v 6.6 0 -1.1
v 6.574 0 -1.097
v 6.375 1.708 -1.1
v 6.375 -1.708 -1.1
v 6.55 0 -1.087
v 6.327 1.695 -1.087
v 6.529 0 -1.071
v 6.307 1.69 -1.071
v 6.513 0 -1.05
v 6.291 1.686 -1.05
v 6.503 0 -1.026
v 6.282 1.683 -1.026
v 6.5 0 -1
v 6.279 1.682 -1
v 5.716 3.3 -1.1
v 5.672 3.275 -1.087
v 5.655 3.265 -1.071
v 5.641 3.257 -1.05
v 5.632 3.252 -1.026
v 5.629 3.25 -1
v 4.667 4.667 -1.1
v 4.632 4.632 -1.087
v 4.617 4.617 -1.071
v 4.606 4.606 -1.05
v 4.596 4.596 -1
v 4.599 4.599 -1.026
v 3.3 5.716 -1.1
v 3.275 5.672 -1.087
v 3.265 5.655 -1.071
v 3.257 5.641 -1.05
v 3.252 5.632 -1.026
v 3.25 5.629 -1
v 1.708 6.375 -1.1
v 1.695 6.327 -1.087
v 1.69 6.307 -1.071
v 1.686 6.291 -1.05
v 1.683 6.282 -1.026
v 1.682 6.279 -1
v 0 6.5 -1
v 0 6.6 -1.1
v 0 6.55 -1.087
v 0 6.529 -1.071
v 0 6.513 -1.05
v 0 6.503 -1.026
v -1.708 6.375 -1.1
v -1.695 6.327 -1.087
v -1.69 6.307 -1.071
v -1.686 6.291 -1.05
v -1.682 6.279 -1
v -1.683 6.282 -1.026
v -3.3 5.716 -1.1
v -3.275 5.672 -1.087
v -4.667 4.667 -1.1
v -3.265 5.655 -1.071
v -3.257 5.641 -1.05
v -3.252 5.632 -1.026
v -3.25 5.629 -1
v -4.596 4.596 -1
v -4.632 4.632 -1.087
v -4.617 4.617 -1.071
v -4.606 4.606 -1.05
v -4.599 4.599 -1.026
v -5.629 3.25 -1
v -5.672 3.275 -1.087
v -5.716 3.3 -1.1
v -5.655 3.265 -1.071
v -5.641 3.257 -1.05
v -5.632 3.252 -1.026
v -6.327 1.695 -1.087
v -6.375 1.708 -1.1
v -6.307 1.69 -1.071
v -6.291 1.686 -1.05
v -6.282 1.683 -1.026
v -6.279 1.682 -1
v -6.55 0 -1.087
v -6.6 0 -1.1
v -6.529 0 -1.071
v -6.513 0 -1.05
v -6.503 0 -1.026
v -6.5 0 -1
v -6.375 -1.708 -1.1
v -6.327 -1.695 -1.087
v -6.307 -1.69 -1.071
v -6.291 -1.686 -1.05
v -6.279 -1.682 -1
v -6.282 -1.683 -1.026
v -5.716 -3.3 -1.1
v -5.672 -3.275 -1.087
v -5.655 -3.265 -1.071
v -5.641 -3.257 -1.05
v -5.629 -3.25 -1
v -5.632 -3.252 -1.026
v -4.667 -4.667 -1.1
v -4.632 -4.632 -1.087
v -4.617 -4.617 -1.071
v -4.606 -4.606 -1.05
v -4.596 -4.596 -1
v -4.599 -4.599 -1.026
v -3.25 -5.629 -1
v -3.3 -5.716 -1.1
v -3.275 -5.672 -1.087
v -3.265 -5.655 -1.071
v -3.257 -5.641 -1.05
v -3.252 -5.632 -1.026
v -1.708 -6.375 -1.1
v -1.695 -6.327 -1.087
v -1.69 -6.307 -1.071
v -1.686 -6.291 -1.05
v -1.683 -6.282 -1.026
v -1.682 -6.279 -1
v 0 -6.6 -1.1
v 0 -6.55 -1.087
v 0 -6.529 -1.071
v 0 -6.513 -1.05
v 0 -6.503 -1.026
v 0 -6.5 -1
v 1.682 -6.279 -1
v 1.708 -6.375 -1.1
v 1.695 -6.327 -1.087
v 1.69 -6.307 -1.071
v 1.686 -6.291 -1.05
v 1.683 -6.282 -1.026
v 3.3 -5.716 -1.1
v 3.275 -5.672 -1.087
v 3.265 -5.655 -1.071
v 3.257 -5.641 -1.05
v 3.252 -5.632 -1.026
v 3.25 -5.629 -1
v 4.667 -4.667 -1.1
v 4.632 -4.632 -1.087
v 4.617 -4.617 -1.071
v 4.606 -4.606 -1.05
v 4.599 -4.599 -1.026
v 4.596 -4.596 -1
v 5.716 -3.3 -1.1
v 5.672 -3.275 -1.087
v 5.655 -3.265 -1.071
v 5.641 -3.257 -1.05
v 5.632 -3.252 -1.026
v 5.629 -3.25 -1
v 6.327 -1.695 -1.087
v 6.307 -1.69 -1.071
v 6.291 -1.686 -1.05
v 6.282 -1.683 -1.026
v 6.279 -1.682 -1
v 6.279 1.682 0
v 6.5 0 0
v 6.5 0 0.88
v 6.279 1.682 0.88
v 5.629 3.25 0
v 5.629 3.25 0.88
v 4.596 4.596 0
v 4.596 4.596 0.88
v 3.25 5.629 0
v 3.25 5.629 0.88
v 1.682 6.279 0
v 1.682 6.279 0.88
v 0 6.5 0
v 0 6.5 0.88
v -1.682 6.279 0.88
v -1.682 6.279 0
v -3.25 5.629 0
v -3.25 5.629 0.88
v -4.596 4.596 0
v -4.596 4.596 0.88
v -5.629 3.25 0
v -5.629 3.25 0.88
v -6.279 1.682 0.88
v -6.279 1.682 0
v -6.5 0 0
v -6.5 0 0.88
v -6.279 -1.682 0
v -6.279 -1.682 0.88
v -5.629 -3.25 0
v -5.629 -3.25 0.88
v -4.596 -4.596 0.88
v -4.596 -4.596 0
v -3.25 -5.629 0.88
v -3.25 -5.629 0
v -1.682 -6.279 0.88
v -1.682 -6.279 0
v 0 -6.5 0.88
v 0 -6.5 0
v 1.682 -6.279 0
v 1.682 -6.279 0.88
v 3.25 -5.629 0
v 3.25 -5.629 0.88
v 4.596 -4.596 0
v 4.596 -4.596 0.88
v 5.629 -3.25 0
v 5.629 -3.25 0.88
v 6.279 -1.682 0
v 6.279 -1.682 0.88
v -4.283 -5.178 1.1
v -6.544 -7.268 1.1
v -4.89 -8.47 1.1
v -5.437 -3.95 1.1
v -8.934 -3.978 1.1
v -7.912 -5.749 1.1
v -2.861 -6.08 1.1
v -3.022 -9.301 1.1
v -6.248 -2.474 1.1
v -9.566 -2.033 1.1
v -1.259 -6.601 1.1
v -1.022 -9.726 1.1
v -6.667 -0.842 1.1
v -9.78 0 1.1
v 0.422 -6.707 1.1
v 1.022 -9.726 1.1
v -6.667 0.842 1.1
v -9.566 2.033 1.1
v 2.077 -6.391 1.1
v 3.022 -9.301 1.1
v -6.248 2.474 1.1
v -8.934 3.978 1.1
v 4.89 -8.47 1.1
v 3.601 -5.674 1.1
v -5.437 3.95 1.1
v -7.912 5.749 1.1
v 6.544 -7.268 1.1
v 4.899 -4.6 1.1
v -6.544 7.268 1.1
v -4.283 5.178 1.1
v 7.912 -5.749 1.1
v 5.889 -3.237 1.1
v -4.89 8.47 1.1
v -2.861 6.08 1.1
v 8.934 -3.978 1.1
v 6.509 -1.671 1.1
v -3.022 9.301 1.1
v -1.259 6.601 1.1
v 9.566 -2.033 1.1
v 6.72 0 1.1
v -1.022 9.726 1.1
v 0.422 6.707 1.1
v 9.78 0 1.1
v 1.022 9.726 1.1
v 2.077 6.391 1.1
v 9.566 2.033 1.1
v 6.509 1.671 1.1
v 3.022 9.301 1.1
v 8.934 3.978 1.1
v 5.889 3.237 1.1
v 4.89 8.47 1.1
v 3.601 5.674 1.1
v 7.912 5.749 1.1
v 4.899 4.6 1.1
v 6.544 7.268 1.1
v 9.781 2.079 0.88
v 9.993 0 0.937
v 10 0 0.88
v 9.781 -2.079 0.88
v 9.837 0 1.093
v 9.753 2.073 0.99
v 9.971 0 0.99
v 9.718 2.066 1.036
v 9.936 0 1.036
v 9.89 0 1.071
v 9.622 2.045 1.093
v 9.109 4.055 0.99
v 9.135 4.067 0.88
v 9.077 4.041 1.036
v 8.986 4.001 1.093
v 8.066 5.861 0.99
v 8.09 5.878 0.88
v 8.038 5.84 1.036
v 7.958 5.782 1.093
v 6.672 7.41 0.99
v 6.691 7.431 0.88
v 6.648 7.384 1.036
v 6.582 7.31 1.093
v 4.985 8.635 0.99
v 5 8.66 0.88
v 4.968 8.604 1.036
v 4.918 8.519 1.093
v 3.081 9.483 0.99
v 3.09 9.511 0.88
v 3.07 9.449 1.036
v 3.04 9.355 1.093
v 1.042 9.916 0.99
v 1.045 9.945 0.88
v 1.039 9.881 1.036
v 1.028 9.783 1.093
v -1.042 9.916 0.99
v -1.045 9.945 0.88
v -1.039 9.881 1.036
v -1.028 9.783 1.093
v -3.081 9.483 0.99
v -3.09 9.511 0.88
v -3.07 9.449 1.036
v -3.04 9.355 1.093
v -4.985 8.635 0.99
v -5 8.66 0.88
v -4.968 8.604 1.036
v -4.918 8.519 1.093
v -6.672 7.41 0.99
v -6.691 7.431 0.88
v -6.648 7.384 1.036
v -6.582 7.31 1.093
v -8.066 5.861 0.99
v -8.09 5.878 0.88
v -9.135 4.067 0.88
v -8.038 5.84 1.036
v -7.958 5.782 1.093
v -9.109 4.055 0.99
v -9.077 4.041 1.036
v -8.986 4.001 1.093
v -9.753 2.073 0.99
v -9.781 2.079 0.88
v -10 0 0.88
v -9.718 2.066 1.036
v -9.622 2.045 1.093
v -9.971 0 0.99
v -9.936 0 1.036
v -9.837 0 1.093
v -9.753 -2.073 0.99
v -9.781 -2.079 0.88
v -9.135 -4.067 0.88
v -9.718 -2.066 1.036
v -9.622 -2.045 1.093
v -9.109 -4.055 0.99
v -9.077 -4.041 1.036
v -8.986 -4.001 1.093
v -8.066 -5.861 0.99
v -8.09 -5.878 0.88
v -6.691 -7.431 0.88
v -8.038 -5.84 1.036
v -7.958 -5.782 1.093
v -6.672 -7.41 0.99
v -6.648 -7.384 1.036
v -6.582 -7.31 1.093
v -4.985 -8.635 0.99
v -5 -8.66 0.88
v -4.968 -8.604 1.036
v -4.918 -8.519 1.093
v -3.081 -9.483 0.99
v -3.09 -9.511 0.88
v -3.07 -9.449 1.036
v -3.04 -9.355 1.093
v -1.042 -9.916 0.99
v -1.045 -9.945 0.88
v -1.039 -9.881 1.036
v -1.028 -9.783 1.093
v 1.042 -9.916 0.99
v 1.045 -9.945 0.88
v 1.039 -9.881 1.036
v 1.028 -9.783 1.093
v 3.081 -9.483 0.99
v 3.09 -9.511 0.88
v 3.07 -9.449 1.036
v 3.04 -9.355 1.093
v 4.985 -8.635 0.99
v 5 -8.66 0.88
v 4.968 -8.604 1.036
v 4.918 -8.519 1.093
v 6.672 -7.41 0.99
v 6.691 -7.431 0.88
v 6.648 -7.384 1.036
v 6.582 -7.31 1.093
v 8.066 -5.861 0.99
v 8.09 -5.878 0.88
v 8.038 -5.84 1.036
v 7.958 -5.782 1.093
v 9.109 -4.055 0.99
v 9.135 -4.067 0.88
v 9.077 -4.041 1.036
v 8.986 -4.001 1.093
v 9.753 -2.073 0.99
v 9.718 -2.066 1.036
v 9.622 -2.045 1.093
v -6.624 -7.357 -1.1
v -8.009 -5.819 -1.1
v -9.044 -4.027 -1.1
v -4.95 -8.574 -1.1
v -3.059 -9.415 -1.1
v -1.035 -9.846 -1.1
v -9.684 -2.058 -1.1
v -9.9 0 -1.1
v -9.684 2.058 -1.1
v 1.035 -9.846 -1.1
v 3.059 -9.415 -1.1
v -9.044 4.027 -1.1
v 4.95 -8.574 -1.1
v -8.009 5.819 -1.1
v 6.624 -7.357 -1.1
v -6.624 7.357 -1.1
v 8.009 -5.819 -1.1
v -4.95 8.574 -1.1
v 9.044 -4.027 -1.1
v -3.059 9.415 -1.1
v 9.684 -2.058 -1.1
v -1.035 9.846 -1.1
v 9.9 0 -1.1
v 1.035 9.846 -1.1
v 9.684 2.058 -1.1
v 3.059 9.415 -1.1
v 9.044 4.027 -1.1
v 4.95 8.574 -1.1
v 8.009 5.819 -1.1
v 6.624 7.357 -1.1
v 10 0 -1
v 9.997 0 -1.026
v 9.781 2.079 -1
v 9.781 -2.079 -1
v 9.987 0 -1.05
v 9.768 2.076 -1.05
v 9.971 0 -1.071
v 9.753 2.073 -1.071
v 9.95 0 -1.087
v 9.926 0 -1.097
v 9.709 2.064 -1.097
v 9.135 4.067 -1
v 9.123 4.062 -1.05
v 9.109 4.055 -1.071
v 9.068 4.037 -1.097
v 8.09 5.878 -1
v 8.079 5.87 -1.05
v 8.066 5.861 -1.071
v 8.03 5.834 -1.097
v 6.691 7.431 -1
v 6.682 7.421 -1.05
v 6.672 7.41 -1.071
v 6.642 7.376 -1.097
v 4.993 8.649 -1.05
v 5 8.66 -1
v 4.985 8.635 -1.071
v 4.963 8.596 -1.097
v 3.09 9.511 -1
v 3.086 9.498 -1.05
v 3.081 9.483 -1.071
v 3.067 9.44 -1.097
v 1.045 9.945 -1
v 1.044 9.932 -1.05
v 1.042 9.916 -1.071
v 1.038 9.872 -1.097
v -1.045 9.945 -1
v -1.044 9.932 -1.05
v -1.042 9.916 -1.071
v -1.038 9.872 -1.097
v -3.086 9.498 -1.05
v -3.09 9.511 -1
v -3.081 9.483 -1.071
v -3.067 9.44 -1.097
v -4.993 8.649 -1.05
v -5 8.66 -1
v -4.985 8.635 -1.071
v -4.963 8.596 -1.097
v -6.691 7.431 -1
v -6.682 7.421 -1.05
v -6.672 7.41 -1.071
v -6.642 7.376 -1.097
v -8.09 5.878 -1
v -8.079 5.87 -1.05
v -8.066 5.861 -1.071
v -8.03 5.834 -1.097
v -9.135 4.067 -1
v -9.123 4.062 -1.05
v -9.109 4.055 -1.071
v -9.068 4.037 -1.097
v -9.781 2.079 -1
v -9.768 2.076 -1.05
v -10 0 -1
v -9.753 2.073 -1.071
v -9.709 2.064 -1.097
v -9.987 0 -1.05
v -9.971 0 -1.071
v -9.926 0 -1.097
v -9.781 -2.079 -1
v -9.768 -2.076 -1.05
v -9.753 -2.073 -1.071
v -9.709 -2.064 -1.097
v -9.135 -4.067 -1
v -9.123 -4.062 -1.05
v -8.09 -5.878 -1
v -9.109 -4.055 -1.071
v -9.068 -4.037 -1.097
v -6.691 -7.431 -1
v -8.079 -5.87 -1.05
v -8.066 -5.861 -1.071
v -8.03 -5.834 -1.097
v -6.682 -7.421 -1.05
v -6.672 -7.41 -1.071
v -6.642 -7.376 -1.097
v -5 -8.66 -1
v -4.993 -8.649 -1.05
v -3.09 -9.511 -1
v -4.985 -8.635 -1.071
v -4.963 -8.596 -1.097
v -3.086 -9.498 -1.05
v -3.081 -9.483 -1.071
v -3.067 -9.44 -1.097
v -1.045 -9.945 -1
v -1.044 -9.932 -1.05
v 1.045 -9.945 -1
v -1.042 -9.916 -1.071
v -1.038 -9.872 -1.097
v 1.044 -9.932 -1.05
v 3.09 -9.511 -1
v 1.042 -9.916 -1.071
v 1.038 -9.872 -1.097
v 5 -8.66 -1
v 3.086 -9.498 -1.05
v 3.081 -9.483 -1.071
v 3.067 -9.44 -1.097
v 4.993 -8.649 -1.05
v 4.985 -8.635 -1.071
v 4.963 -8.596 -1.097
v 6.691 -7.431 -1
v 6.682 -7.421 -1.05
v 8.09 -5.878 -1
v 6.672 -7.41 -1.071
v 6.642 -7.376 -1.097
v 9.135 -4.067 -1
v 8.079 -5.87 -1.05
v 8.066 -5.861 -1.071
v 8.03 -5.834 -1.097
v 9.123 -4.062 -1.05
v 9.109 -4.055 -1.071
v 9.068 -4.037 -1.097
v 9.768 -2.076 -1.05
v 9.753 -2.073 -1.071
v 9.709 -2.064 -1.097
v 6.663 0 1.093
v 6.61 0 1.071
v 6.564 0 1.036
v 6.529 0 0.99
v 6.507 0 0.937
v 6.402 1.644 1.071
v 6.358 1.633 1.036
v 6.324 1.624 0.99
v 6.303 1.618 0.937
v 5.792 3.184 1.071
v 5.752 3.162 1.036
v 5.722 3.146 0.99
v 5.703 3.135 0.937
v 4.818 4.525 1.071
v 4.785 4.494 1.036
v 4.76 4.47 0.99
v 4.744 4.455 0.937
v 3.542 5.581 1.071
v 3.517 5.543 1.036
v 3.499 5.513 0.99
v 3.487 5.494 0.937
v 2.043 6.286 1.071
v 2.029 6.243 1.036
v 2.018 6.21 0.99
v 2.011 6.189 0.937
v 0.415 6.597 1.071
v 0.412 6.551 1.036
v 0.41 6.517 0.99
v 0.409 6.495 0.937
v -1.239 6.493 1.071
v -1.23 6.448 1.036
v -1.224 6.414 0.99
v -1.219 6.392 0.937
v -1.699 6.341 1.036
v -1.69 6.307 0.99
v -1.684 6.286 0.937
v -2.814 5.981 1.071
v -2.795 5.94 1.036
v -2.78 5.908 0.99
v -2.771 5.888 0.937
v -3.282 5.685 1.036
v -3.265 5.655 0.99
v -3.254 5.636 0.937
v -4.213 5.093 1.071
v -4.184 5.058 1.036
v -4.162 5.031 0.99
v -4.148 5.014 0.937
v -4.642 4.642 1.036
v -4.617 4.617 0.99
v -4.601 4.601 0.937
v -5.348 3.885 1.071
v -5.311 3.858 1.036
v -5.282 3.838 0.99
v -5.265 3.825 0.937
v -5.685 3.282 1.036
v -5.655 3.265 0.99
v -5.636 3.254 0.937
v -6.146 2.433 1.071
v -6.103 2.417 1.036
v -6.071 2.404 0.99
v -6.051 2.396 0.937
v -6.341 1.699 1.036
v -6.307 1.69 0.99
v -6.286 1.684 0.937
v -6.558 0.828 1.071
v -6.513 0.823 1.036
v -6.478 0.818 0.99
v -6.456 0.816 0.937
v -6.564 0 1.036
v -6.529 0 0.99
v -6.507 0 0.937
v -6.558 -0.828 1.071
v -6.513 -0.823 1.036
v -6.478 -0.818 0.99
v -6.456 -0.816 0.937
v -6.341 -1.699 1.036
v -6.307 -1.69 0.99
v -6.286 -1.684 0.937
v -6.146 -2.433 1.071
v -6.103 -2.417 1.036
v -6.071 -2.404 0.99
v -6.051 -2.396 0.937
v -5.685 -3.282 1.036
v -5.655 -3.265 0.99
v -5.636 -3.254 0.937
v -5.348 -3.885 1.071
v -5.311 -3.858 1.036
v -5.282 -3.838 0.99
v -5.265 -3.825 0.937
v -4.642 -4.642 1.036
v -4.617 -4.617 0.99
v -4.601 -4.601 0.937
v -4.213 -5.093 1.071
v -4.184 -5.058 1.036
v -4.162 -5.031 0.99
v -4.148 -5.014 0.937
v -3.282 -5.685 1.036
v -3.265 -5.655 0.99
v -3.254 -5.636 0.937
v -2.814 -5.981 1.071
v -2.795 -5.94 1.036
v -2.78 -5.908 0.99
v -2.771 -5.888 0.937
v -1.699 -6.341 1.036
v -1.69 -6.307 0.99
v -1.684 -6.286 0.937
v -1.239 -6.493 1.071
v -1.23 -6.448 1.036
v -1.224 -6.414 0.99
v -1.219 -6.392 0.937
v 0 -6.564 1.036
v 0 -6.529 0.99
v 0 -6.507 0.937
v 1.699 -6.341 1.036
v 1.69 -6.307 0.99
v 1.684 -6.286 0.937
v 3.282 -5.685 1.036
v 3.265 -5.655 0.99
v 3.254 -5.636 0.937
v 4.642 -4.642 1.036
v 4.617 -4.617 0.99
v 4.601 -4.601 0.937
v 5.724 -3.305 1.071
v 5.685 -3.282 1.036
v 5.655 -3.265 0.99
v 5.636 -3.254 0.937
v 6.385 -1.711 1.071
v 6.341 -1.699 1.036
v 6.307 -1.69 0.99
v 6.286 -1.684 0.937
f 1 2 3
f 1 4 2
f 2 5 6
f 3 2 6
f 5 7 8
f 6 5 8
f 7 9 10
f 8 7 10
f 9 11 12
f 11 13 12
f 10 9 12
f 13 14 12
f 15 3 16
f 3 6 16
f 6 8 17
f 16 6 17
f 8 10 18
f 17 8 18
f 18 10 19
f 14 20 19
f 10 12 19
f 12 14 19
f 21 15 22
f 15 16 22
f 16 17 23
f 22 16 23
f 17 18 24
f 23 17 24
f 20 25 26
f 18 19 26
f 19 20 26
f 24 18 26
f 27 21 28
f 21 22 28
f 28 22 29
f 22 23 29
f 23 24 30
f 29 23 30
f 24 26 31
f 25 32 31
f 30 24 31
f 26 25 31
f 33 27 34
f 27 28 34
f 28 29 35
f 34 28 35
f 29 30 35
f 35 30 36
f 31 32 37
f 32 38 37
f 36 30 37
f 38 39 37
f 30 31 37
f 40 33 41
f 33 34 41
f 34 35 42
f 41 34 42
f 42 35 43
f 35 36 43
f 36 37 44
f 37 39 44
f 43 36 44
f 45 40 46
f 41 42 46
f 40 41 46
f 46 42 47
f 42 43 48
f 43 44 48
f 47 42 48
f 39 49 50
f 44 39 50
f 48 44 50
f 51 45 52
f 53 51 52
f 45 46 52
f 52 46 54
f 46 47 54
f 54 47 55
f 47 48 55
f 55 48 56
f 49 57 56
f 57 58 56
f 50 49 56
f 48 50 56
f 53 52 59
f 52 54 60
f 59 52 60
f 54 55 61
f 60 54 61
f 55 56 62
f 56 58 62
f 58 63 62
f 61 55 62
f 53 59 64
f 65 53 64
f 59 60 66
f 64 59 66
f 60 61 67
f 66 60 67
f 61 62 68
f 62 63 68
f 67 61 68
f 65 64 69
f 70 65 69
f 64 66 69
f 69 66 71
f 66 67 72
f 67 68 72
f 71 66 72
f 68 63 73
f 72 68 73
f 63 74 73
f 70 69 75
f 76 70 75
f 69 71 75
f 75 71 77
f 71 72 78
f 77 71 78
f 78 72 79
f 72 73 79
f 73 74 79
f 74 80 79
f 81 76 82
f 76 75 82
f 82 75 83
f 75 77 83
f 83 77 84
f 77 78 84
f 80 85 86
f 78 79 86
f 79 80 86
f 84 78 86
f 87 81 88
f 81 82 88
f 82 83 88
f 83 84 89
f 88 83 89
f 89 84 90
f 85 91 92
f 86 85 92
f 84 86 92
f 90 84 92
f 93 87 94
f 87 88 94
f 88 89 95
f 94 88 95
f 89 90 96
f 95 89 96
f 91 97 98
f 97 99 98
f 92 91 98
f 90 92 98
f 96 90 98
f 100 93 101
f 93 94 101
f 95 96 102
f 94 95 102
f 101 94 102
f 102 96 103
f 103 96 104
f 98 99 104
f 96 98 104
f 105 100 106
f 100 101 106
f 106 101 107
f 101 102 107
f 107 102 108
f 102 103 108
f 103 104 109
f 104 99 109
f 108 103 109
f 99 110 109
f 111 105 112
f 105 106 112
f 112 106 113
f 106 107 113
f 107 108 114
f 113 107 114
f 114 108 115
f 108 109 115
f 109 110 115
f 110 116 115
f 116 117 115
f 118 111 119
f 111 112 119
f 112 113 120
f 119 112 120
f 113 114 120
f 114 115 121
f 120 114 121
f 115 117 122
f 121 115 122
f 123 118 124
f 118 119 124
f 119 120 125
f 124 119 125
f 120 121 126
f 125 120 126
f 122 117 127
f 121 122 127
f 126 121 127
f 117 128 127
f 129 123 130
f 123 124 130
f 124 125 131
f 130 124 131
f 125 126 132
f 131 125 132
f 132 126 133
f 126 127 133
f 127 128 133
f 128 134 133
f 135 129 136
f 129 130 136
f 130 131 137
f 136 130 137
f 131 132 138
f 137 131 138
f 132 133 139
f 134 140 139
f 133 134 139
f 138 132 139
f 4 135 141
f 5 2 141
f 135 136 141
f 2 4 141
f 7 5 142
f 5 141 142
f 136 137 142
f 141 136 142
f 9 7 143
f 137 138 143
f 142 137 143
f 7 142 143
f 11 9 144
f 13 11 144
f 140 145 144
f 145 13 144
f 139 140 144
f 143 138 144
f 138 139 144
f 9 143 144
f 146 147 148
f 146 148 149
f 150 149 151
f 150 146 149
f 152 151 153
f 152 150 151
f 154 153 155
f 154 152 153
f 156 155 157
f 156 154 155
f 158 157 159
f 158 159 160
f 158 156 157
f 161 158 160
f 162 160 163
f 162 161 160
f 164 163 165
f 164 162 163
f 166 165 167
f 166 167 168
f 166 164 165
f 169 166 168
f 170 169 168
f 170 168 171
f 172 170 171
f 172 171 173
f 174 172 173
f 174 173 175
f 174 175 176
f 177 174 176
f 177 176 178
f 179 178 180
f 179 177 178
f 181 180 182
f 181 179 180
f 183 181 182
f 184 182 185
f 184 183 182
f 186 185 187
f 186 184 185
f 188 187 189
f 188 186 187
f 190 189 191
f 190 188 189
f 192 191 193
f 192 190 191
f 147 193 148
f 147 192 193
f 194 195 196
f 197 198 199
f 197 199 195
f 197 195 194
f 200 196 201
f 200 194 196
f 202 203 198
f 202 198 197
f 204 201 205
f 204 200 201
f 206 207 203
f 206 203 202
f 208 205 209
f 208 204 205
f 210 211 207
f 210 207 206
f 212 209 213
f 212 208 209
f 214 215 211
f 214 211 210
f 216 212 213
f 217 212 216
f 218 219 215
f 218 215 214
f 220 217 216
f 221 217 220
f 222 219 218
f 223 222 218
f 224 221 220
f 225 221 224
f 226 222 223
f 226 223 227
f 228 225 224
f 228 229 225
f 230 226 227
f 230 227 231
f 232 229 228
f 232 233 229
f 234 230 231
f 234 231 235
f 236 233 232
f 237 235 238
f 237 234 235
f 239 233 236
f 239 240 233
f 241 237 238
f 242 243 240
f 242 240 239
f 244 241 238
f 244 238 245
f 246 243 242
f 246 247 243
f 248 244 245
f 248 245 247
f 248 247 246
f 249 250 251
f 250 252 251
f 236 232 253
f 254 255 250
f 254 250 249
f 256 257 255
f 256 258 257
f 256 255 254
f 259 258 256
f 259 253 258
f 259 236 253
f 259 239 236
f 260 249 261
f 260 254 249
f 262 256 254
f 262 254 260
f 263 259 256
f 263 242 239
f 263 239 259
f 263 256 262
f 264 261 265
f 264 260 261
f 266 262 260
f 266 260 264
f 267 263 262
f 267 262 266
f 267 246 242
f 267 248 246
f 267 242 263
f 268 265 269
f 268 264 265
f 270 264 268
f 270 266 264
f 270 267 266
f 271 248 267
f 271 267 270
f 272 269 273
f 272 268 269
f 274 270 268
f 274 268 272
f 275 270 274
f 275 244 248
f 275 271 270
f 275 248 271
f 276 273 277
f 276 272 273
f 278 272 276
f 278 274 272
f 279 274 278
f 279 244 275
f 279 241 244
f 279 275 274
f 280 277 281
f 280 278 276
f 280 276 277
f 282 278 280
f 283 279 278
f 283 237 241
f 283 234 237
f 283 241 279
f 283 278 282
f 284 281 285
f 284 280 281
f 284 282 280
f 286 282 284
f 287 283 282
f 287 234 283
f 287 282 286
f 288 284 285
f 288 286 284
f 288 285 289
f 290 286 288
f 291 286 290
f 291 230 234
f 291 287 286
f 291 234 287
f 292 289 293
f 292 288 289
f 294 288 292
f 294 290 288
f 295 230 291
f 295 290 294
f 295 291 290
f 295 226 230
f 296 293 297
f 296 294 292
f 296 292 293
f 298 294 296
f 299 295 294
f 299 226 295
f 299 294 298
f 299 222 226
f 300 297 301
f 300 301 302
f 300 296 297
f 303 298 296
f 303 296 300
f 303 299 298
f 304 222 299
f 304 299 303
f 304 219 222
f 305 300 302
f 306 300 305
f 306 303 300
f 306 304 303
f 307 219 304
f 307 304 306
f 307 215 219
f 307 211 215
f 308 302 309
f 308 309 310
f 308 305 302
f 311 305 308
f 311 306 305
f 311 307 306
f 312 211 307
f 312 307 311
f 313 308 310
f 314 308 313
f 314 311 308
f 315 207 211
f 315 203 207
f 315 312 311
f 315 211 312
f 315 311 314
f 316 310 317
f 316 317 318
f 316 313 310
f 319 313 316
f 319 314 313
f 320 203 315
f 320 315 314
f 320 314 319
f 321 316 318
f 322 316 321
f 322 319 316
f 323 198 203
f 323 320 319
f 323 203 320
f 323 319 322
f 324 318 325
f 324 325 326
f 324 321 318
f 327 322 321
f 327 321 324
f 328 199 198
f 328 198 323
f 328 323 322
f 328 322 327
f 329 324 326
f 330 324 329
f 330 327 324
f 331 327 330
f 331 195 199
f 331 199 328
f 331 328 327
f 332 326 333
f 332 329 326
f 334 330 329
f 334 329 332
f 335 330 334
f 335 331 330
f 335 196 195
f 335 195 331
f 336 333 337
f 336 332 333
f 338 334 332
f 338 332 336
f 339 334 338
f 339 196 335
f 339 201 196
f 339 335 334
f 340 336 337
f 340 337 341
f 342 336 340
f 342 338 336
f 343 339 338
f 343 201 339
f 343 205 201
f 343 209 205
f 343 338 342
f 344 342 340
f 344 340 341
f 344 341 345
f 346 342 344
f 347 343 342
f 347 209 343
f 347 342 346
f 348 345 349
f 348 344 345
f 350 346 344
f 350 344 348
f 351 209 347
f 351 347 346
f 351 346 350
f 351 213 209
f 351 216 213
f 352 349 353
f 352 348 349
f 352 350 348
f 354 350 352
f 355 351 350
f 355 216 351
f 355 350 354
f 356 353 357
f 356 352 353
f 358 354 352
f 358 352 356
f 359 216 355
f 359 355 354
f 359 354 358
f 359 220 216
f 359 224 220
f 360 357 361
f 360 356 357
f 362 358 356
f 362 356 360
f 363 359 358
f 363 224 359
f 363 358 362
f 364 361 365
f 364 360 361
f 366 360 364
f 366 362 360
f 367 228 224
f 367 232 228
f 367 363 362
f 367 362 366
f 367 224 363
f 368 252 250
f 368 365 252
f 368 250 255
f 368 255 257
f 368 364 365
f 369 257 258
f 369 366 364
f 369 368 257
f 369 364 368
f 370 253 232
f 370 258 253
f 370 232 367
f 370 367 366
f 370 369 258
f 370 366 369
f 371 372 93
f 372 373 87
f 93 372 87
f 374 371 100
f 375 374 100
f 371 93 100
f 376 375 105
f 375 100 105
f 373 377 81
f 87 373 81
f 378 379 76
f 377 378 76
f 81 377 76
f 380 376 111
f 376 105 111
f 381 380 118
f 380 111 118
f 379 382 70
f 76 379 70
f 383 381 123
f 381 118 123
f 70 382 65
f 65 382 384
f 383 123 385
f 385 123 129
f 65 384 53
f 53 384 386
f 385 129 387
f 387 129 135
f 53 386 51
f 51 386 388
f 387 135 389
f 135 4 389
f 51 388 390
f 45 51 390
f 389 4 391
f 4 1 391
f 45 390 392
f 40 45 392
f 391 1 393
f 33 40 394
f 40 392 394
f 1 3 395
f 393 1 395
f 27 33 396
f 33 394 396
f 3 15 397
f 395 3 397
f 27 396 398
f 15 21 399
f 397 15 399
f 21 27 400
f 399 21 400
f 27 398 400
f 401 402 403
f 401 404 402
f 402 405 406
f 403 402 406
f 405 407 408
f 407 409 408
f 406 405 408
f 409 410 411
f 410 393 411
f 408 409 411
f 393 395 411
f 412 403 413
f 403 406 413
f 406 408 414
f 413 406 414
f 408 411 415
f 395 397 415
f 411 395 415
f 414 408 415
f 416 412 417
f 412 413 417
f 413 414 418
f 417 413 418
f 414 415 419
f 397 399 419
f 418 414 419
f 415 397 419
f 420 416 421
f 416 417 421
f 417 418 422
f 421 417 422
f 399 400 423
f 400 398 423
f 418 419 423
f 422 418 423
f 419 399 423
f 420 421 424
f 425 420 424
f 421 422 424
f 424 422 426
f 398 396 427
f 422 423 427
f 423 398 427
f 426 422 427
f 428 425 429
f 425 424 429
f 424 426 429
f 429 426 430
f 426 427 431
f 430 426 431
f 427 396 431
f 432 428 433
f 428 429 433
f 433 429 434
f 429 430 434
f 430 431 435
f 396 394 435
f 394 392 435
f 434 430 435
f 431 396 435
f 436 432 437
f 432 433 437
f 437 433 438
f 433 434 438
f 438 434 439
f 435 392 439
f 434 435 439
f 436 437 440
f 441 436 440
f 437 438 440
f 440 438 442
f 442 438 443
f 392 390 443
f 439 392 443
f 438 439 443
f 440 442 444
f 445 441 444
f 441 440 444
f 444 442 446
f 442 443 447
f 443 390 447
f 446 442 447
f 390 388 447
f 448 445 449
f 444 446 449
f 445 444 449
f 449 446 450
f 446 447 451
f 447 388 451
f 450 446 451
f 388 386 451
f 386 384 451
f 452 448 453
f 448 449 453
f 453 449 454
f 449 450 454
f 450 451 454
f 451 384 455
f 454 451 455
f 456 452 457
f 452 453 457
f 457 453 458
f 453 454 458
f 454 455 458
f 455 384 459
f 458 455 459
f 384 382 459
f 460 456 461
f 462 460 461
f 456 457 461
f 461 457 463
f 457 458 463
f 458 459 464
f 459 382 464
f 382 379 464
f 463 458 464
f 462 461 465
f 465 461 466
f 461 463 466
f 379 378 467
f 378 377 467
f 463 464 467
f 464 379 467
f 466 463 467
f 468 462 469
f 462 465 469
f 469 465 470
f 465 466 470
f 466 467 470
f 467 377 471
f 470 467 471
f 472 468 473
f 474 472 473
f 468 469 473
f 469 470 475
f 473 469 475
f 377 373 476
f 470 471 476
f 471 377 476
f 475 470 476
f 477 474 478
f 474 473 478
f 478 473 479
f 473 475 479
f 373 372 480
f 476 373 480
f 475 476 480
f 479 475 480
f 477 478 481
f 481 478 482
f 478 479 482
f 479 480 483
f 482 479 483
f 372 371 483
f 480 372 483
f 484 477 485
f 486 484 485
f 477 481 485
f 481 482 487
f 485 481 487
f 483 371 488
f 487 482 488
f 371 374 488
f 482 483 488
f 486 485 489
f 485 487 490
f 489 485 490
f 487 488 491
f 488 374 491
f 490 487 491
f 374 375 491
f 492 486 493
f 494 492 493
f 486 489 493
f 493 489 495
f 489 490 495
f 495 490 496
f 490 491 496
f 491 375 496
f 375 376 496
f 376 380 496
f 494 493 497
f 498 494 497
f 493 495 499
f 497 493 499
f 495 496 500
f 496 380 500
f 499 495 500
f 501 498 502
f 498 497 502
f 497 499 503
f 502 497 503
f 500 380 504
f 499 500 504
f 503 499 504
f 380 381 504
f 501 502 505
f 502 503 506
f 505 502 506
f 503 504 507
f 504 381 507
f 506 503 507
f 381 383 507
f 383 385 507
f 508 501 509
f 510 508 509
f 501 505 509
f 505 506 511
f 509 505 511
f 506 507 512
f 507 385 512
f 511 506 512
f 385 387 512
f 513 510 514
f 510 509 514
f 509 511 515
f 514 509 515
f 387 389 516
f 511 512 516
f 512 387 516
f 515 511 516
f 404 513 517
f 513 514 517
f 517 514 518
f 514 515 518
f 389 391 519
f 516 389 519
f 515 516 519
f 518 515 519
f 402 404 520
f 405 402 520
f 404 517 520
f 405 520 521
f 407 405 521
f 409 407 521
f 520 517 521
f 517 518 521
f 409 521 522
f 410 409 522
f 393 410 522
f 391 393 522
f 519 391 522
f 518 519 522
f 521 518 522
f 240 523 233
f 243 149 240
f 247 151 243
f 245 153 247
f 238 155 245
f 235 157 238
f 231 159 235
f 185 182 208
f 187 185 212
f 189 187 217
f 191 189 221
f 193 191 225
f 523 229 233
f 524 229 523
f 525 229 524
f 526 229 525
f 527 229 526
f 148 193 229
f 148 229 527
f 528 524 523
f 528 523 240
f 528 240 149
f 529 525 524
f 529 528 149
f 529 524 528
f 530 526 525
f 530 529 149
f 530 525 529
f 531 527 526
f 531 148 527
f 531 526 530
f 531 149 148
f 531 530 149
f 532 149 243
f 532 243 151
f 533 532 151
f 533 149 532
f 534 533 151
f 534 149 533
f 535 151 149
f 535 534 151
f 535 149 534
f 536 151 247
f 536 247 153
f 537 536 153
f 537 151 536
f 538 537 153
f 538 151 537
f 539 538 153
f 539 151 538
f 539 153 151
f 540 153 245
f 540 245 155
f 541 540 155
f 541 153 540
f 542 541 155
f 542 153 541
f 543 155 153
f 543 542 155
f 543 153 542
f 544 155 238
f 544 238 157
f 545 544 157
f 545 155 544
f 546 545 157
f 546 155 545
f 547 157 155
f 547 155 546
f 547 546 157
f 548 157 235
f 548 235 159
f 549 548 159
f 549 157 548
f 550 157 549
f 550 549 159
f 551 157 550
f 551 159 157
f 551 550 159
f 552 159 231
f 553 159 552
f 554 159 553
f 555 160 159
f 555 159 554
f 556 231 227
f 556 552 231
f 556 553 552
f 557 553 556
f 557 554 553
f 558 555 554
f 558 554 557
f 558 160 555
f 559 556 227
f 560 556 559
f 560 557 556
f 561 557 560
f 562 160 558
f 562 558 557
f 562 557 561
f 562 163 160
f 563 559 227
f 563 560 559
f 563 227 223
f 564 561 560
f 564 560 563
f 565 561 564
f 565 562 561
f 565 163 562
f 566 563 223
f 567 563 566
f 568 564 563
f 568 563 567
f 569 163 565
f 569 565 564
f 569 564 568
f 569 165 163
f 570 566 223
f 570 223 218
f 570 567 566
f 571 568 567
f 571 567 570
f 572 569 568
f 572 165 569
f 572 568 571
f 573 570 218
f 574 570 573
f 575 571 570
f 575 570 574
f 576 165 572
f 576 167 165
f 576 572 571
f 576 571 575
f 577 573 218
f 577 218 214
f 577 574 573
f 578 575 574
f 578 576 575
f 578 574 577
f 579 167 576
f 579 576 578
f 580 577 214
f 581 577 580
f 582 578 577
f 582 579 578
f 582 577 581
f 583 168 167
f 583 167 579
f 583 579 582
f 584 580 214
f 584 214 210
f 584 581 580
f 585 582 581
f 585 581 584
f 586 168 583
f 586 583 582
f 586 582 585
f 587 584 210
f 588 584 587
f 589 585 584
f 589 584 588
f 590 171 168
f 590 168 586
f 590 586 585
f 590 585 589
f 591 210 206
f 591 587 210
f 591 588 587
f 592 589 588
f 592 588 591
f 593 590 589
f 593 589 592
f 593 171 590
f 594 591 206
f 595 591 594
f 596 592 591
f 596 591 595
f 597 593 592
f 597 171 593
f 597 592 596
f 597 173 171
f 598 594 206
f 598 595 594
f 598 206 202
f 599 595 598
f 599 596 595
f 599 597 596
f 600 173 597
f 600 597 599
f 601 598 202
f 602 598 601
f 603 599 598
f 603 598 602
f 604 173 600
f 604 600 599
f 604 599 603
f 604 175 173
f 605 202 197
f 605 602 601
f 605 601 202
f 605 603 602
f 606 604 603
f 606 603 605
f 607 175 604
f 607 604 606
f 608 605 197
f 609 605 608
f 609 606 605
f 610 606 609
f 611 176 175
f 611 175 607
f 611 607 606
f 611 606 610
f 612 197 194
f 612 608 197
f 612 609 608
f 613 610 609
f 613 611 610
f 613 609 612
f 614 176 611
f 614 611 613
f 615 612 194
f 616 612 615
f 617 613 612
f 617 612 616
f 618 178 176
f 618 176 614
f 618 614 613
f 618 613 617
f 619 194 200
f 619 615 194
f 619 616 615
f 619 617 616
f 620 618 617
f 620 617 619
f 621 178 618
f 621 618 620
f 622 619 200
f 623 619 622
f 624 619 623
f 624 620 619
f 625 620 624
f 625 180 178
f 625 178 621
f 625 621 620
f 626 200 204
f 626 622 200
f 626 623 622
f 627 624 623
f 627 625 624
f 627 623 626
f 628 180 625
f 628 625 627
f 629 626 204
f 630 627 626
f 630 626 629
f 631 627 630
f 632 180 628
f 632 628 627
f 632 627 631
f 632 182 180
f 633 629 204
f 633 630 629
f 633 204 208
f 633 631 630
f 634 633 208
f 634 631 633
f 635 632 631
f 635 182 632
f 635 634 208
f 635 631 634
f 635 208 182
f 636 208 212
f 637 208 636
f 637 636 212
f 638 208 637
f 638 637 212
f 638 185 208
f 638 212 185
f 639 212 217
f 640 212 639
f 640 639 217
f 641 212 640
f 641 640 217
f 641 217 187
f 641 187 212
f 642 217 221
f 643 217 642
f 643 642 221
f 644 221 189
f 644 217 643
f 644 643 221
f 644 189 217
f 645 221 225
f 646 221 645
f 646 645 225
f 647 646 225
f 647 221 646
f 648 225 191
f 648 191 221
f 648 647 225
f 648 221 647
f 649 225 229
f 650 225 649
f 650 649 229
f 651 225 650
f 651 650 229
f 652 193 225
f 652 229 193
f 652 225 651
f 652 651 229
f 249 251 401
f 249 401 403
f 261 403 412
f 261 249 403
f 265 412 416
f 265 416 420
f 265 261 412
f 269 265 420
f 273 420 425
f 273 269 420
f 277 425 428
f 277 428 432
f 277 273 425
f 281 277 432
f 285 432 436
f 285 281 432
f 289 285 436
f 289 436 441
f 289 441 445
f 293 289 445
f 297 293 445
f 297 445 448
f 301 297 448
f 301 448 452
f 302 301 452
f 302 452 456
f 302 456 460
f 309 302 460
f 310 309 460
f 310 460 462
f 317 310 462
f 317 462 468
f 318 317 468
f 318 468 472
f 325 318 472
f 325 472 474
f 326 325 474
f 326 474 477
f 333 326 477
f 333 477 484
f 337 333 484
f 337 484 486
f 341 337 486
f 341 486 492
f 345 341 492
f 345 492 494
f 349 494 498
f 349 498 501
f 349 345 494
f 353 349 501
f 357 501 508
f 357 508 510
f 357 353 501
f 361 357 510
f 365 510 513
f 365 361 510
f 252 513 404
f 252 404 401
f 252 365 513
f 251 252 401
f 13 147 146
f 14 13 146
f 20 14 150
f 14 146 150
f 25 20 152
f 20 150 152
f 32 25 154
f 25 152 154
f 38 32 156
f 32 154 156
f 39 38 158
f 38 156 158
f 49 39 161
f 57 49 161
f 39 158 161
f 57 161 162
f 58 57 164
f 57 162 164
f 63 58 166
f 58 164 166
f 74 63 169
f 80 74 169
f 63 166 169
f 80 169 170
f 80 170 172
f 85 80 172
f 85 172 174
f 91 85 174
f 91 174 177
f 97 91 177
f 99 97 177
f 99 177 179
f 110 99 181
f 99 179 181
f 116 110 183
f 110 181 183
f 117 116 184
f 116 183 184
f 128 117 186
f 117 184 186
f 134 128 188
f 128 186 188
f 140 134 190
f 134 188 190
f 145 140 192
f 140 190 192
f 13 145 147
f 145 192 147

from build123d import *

# Parameters (mm, degrees)
SKETCH3_R                = 10
SKETCH3_R_2              = 6.5
BOSS_EXTRUDE1_DEPTH      = 1.1
BOSS_EXTRUDE1_DEPTH_BACK = 1.1
FILLET1_R                = 0.22
FILLET2_R                = 0.1


with BuildPart() as part:
    # Sketch3 → Boss-Extrude1 (new body, two sides)
    with BuildSketch(Plane.XY) as boss_extrude1_sk:
        Circle(SKETCH3_R)
        Circle(SKETCH3_R_2, mode=Mode.SUBTRACT)
    extrude(amount=BOSS_EXTRUDE1_DEPTH)
    extrude(boss_extrude1_sk.sketch, amount=-BOSS_EXTRUDE1_DEPTH_BACK)

    # Fillet1
    fillet1_edges = [part.edges().sort_by_distance(p)[0] for p in [
        (-10, 0, 1.1),
        (-6.5, 0, 1.1),
    ]]
    fillet(fillet1_edges, radius=FILLET1_R)

    # Fillet2
    fillet2_edges = [part.edges().sort_by_distance(p)[0] for p in [
        (-10, 0, -1.1),
        (-6.5, 0, -1.1),
    ]]
    fillet(fillet2_edges, radius=FILLET2_R)


solid = part.part
